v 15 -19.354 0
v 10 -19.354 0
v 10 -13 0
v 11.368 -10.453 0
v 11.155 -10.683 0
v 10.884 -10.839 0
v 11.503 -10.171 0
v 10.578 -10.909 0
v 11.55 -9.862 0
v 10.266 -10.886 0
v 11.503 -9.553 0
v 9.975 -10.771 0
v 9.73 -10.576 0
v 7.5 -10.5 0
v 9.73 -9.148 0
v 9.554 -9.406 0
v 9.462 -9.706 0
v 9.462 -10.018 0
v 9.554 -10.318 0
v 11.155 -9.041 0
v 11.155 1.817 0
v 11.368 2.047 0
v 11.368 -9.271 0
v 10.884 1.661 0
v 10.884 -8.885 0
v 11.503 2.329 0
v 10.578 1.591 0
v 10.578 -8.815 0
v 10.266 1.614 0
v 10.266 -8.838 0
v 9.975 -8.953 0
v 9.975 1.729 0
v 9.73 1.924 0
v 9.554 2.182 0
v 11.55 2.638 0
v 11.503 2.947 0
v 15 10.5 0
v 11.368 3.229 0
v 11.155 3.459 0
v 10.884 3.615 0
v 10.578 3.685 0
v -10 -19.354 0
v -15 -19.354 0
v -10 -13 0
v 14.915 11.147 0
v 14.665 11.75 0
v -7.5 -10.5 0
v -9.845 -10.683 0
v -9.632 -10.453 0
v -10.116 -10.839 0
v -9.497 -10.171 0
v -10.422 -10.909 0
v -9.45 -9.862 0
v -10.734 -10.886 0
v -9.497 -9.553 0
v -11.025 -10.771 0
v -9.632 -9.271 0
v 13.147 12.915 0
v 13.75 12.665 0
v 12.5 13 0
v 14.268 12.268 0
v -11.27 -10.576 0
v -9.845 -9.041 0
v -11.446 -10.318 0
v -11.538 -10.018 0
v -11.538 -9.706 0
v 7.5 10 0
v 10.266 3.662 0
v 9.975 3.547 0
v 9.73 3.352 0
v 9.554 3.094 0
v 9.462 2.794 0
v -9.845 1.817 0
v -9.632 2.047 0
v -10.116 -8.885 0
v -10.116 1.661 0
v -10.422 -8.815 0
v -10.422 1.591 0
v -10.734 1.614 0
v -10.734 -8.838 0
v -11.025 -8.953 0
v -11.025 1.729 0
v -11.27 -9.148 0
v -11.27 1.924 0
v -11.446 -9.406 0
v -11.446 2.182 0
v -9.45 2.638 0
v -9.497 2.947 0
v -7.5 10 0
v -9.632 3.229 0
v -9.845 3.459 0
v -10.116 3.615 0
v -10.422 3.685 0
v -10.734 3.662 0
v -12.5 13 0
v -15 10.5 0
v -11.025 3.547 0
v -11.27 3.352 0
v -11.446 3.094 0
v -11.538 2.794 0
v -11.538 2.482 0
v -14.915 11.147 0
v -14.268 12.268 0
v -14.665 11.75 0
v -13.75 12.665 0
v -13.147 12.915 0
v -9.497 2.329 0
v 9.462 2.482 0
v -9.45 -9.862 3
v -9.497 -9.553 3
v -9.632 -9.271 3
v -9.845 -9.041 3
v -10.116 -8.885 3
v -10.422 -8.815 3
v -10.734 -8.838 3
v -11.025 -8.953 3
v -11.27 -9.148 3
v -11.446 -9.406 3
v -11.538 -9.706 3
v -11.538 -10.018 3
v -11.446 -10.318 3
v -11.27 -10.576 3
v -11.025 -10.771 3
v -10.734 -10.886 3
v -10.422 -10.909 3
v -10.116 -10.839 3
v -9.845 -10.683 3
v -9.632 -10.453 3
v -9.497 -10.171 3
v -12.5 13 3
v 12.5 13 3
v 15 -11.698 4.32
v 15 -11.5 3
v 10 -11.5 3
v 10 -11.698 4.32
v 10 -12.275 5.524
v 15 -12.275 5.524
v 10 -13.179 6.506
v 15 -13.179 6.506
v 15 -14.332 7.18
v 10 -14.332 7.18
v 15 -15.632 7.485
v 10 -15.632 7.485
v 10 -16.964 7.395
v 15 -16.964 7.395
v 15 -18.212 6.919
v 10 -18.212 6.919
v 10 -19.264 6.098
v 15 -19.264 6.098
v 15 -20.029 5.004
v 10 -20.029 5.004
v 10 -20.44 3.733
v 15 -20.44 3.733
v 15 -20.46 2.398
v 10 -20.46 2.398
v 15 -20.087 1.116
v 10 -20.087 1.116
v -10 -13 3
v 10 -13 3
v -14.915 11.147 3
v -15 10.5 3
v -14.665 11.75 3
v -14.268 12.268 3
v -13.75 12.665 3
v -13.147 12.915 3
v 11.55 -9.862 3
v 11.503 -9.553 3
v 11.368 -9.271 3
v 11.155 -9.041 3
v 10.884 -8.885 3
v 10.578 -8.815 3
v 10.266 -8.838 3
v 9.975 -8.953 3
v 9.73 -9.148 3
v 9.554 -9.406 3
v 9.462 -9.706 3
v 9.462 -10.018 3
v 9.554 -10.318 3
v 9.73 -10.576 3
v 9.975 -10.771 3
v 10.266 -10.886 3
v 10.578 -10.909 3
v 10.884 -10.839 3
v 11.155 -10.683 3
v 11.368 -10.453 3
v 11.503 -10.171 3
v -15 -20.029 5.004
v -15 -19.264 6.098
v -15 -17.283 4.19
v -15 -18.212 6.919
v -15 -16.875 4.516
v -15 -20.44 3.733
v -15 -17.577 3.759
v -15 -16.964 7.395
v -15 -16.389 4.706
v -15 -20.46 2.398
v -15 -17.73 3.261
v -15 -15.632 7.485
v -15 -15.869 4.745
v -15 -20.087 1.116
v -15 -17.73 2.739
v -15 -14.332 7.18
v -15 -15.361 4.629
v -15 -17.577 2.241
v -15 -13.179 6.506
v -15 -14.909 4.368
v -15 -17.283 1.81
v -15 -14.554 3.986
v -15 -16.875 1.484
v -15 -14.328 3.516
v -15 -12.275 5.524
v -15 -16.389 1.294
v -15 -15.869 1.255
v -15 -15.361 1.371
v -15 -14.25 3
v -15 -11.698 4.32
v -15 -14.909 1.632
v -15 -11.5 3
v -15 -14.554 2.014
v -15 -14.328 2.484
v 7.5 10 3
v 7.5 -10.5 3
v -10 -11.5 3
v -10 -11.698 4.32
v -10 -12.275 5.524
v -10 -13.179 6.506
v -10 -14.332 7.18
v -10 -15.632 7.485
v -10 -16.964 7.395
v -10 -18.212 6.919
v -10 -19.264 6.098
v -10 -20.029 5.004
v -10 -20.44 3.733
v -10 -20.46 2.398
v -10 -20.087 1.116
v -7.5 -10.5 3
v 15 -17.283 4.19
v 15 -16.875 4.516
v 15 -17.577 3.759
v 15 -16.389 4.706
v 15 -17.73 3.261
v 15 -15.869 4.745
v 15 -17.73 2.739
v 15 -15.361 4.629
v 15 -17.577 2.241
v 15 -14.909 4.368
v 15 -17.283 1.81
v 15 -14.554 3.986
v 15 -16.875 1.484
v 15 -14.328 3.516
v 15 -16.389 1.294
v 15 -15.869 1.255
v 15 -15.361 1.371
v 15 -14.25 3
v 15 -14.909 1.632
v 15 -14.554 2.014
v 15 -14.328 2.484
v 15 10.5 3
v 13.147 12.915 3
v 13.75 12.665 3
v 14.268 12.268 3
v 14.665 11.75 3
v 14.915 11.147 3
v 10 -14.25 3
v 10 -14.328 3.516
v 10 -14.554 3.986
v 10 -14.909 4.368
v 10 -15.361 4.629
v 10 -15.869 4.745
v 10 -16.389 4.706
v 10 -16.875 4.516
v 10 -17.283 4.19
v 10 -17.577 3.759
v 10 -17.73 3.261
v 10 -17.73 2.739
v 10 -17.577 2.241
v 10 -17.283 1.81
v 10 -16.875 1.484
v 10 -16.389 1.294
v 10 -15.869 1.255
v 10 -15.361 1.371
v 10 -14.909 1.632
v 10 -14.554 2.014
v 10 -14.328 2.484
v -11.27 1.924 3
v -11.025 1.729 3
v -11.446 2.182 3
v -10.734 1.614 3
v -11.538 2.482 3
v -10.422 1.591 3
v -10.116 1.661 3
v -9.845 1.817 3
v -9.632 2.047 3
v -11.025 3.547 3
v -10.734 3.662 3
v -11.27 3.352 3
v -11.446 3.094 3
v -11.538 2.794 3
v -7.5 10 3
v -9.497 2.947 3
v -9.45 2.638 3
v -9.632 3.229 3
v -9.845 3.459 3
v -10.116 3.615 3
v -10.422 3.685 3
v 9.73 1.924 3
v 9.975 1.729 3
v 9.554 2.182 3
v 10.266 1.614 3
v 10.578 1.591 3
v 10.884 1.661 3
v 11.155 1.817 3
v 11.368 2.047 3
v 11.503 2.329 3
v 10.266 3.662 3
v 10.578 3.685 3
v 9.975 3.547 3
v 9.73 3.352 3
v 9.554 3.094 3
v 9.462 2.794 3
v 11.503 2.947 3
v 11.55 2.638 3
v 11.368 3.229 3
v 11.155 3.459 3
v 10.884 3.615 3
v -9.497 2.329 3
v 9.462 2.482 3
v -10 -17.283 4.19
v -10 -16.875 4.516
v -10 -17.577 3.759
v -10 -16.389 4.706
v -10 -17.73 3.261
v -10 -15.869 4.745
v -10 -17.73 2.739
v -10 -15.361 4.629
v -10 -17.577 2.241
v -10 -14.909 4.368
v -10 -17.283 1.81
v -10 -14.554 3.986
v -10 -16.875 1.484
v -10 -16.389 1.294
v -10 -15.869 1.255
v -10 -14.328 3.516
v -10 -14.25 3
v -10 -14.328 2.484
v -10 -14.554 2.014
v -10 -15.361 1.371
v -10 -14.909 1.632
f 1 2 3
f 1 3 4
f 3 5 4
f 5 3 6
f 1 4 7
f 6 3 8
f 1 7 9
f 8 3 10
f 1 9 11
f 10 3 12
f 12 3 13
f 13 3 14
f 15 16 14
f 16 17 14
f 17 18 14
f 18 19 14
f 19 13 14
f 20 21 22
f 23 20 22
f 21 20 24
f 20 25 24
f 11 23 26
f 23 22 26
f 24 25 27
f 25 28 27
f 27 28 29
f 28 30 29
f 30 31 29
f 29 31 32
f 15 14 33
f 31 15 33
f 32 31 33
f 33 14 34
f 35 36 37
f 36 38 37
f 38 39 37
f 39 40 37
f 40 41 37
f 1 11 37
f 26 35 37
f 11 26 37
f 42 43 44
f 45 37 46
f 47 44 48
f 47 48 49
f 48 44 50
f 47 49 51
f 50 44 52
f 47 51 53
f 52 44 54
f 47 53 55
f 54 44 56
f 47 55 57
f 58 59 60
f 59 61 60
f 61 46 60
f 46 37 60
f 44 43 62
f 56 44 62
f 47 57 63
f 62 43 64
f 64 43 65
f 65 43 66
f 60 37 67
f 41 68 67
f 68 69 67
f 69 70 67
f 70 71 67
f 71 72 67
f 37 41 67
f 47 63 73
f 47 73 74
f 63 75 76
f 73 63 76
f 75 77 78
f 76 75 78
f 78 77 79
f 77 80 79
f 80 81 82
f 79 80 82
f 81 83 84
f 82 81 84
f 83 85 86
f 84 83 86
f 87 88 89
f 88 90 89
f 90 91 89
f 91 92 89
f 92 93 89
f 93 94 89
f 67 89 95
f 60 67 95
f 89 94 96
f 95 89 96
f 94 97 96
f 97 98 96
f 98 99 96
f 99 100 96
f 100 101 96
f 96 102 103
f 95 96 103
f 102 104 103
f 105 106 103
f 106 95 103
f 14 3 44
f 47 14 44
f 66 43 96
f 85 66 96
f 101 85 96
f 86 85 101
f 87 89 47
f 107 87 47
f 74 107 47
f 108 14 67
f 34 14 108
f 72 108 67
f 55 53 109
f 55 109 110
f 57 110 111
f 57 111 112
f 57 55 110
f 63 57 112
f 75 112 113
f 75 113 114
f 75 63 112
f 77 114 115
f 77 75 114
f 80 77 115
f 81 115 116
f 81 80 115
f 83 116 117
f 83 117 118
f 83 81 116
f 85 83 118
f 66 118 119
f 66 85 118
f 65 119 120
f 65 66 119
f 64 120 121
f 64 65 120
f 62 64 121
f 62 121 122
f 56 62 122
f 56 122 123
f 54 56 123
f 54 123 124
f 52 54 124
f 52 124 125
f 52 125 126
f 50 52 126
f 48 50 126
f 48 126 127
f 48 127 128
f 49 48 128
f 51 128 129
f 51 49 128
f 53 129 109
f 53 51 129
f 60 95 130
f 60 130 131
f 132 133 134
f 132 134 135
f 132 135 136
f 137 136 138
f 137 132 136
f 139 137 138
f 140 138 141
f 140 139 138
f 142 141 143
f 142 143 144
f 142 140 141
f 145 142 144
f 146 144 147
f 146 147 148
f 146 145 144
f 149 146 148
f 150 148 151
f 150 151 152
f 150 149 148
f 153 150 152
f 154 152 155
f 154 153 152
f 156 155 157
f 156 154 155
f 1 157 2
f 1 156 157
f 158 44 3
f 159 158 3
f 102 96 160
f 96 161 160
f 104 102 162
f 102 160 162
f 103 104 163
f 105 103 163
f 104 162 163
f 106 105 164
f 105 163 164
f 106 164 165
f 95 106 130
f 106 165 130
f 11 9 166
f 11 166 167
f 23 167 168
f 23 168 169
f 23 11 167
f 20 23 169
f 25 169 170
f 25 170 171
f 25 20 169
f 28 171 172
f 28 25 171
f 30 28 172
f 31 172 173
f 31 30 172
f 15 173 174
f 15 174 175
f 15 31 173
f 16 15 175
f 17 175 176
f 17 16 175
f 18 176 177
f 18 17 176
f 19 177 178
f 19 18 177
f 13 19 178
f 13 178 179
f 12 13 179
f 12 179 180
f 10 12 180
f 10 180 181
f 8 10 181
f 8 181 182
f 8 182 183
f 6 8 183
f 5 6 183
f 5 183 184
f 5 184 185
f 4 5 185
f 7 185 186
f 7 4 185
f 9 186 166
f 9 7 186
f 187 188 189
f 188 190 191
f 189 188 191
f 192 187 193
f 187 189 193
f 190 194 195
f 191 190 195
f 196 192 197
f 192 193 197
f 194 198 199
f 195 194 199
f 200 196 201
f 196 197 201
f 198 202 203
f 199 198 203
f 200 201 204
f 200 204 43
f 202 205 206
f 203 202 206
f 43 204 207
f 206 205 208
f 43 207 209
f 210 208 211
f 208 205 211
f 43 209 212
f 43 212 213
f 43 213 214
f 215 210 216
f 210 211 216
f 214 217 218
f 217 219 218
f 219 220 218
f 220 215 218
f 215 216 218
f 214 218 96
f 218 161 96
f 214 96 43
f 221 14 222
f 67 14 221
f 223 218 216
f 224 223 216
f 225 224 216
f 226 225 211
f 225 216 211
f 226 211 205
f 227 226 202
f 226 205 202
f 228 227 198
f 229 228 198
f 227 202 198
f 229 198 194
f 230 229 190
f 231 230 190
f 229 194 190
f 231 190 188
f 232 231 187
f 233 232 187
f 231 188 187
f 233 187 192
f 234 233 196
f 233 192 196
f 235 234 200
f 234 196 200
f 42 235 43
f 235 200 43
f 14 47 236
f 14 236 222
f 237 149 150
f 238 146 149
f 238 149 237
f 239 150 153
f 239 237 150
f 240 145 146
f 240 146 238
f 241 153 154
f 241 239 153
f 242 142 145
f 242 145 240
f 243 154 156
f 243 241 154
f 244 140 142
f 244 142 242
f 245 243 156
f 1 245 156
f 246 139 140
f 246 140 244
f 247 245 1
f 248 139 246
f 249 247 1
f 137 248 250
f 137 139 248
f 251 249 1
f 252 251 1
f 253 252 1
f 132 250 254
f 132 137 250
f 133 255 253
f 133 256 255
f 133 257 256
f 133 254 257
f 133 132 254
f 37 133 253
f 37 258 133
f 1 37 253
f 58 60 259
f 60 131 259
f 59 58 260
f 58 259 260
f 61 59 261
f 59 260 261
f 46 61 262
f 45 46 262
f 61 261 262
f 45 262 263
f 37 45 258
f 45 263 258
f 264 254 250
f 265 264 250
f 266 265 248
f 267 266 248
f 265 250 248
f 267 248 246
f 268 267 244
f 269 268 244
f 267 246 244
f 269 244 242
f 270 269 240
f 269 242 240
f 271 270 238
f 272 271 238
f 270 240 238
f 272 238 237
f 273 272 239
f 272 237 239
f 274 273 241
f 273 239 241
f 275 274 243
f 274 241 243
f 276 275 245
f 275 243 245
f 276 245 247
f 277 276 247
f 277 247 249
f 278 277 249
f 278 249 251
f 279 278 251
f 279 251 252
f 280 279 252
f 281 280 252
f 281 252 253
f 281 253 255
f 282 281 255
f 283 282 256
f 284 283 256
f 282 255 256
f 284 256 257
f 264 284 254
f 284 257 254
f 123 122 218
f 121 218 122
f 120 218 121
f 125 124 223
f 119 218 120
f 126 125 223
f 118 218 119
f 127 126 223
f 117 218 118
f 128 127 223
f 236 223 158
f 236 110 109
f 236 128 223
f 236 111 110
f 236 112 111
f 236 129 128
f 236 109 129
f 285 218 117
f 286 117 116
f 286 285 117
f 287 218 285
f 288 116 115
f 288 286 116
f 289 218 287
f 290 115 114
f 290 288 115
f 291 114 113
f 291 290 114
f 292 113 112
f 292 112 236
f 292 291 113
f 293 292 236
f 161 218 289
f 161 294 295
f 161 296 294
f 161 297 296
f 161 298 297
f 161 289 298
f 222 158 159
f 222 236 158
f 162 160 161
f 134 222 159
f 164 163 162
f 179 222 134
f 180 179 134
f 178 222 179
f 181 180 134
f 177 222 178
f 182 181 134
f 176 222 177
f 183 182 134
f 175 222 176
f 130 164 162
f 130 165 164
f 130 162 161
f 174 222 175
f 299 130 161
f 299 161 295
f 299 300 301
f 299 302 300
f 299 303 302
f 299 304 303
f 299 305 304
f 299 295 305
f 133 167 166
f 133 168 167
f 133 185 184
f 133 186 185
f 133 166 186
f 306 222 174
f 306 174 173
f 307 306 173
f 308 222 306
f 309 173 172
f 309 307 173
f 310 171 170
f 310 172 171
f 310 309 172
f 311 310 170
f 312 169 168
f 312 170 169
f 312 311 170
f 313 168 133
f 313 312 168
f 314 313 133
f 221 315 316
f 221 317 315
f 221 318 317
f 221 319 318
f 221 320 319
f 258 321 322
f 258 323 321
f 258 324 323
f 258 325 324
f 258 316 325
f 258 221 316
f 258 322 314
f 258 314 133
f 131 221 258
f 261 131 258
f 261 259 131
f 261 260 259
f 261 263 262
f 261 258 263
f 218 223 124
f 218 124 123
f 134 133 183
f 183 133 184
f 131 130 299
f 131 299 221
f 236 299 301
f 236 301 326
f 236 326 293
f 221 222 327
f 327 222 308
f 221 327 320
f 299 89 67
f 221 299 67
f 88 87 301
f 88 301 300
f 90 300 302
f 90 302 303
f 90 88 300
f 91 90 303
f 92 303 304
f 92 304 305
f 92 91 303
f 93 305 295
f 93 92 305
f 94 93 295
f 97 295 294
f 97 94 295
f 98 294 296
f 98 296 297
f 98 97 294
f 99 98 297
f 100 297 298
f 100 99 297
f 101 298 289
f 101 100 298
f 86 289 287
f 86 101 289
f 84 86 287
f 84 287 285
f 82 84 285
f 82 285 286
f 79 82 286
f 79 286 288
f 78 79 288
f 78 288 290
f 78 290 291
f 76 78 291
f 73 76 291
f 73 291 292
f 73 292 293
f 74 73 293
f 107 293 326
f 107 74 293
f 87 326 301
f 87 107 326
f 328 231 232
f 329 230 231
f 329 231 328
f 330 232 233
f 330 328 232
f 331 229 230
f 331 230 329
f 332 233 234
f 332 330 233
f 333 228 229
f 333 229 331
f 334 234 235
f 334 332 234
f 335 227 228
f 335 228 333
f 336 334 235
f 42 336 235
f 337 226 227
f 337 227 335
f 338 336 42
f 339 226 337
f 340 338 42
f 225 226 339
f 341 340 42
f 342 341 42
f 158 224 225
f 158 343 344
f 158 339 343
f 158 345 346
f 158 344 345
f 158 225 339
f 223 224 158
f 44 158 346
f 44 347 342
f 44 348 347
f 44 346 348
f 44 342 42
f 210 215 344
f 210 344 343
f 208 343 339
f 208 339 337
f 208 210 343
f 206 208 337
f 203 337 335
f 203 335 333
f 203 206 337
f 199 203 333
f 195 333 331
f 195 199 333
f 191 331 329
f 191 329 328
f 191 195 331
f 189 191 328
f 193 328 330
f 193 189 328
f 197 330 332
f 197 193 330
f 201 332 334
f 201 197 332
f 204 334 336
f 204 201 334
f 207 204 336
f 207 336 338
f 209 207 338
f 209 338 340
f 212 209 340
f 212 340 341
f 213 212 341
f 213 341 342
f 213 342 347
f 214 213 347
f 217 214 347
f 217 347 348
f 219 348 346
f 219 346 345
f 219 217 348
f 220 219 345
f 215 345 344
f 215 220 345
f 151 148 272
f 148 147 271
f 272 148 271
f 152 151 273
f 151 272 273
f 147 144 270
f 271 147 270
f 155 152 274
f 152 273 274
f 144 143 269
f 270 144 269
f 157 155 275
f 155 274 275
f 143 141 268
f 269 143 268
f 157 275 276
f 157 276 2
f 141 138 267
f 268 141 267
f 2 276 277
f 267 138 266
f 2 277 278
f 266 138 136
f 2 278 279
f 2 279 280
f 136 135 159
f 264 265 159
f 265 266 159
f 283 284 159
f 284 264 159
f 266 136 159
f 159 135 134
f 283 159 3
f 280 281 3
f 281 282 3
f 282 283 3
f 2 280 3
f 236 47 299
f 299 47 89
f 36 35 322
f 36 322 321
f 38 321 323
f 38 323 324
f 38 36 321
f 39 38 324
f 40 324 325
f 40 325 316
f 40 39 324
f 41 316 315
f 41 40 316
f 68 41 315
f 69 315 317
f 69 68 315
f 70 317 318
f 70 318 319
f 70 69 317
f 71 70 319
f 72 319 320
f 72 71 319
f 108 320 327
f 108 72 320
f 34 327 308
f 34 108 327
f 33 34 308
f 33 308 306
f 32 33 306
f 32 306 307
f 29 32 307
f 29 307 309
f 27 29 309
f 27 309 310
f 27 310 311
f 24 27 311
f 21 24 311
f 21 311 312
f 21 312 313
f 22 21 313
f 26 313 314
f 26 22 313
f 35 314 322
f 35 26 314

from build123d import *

# Parameters (mm, degrees)
ESQUISSE1_W        = 30
ESQUISSE1_H        = 26
ESQUISSE1_R        = 1.05
ESQUISSE1_W_2      = 15
ESQUISSE1_H_2      = 20.5
BOSS_EXTRU_1_DEPTH = 3
CONG_1_R           = 2.5
ESQUISSE3_R        = 1.75
BOSS_EXTRU_3_DEPTH = 5


with BuildPart() as part:
    # Esquisse1 → Boss.-Extru.1 (new body)
    with BuildSketch(Plane.XY):
        Rectangle(ESQUISSE1_W, ESQUISSE1_H)
        with Locations((-10.5, 2.638)):
            Circle(ESQUISSE1_R, mode=Mode.SUBTRACT)
        with Locations((10.5, 2.638)):
            Circle(ESQUISSE1_R, mode=Mode.SUBTRACT)
        with Locations((-10.5, -9.862)):
            Circle(ESQUISSE1_R, mode=Mode.SUBTRACT)
        with Locations((10.5, -9.862)):
            Circle(ESQUISSE1_R, mode=Mode.SUBTRACT)
        with Locations((0, -0.25)):
            Rectangle(ESQUISSE1_W_2, ESQUISSE1_H_2, mode=Mode.SUBTRACT)
    extrude(amount=BOSS_EXTRU_1_DEPTH)

    # Congé1
    cong_1_edges = [part.edges().sort_by_distance(p)[0] for p in [
        (15, 13, 1.5),
        (-15, 13, 1.5),
    ]]
    fillet(cong_1_edges, radius=CONG_1_R)

    # Esquisse3 → Boss.-Extru.3 (add)
    with BuildSketch(Plane(origin=(15, 0, 0), x_dir=(0, 0, -1), z_dir=(1, 0, 0))):
        with BuildLine():
            ThreePointArc((-3, -11.5), (-7.203775615, -17.605699404), (0, -19.354101966))
            Line((0, -19.354101966), (0, -13))
            Line((0, -13), (-3, -13))
            Line((-3, -13), (-3, -11.5))
        make_face()
        with Locations(Location((-3, -16, 0), (0, 0, 90))):
            Circle(ESQUISSE3_R, mode=Mode.SUBTRACT)
    boss_extru_3 = extrude(amount=-BOSS_EXTRU_3_DEPTH)

    # Symétrie2: Boss.-Extru.3 across plane
    add(boss_extru_3.mirror(Plane(origin=(0, 0, 0), x_dir=(0, 0, 1), z_dir=(1, 0, 0))))


solid = part.part
